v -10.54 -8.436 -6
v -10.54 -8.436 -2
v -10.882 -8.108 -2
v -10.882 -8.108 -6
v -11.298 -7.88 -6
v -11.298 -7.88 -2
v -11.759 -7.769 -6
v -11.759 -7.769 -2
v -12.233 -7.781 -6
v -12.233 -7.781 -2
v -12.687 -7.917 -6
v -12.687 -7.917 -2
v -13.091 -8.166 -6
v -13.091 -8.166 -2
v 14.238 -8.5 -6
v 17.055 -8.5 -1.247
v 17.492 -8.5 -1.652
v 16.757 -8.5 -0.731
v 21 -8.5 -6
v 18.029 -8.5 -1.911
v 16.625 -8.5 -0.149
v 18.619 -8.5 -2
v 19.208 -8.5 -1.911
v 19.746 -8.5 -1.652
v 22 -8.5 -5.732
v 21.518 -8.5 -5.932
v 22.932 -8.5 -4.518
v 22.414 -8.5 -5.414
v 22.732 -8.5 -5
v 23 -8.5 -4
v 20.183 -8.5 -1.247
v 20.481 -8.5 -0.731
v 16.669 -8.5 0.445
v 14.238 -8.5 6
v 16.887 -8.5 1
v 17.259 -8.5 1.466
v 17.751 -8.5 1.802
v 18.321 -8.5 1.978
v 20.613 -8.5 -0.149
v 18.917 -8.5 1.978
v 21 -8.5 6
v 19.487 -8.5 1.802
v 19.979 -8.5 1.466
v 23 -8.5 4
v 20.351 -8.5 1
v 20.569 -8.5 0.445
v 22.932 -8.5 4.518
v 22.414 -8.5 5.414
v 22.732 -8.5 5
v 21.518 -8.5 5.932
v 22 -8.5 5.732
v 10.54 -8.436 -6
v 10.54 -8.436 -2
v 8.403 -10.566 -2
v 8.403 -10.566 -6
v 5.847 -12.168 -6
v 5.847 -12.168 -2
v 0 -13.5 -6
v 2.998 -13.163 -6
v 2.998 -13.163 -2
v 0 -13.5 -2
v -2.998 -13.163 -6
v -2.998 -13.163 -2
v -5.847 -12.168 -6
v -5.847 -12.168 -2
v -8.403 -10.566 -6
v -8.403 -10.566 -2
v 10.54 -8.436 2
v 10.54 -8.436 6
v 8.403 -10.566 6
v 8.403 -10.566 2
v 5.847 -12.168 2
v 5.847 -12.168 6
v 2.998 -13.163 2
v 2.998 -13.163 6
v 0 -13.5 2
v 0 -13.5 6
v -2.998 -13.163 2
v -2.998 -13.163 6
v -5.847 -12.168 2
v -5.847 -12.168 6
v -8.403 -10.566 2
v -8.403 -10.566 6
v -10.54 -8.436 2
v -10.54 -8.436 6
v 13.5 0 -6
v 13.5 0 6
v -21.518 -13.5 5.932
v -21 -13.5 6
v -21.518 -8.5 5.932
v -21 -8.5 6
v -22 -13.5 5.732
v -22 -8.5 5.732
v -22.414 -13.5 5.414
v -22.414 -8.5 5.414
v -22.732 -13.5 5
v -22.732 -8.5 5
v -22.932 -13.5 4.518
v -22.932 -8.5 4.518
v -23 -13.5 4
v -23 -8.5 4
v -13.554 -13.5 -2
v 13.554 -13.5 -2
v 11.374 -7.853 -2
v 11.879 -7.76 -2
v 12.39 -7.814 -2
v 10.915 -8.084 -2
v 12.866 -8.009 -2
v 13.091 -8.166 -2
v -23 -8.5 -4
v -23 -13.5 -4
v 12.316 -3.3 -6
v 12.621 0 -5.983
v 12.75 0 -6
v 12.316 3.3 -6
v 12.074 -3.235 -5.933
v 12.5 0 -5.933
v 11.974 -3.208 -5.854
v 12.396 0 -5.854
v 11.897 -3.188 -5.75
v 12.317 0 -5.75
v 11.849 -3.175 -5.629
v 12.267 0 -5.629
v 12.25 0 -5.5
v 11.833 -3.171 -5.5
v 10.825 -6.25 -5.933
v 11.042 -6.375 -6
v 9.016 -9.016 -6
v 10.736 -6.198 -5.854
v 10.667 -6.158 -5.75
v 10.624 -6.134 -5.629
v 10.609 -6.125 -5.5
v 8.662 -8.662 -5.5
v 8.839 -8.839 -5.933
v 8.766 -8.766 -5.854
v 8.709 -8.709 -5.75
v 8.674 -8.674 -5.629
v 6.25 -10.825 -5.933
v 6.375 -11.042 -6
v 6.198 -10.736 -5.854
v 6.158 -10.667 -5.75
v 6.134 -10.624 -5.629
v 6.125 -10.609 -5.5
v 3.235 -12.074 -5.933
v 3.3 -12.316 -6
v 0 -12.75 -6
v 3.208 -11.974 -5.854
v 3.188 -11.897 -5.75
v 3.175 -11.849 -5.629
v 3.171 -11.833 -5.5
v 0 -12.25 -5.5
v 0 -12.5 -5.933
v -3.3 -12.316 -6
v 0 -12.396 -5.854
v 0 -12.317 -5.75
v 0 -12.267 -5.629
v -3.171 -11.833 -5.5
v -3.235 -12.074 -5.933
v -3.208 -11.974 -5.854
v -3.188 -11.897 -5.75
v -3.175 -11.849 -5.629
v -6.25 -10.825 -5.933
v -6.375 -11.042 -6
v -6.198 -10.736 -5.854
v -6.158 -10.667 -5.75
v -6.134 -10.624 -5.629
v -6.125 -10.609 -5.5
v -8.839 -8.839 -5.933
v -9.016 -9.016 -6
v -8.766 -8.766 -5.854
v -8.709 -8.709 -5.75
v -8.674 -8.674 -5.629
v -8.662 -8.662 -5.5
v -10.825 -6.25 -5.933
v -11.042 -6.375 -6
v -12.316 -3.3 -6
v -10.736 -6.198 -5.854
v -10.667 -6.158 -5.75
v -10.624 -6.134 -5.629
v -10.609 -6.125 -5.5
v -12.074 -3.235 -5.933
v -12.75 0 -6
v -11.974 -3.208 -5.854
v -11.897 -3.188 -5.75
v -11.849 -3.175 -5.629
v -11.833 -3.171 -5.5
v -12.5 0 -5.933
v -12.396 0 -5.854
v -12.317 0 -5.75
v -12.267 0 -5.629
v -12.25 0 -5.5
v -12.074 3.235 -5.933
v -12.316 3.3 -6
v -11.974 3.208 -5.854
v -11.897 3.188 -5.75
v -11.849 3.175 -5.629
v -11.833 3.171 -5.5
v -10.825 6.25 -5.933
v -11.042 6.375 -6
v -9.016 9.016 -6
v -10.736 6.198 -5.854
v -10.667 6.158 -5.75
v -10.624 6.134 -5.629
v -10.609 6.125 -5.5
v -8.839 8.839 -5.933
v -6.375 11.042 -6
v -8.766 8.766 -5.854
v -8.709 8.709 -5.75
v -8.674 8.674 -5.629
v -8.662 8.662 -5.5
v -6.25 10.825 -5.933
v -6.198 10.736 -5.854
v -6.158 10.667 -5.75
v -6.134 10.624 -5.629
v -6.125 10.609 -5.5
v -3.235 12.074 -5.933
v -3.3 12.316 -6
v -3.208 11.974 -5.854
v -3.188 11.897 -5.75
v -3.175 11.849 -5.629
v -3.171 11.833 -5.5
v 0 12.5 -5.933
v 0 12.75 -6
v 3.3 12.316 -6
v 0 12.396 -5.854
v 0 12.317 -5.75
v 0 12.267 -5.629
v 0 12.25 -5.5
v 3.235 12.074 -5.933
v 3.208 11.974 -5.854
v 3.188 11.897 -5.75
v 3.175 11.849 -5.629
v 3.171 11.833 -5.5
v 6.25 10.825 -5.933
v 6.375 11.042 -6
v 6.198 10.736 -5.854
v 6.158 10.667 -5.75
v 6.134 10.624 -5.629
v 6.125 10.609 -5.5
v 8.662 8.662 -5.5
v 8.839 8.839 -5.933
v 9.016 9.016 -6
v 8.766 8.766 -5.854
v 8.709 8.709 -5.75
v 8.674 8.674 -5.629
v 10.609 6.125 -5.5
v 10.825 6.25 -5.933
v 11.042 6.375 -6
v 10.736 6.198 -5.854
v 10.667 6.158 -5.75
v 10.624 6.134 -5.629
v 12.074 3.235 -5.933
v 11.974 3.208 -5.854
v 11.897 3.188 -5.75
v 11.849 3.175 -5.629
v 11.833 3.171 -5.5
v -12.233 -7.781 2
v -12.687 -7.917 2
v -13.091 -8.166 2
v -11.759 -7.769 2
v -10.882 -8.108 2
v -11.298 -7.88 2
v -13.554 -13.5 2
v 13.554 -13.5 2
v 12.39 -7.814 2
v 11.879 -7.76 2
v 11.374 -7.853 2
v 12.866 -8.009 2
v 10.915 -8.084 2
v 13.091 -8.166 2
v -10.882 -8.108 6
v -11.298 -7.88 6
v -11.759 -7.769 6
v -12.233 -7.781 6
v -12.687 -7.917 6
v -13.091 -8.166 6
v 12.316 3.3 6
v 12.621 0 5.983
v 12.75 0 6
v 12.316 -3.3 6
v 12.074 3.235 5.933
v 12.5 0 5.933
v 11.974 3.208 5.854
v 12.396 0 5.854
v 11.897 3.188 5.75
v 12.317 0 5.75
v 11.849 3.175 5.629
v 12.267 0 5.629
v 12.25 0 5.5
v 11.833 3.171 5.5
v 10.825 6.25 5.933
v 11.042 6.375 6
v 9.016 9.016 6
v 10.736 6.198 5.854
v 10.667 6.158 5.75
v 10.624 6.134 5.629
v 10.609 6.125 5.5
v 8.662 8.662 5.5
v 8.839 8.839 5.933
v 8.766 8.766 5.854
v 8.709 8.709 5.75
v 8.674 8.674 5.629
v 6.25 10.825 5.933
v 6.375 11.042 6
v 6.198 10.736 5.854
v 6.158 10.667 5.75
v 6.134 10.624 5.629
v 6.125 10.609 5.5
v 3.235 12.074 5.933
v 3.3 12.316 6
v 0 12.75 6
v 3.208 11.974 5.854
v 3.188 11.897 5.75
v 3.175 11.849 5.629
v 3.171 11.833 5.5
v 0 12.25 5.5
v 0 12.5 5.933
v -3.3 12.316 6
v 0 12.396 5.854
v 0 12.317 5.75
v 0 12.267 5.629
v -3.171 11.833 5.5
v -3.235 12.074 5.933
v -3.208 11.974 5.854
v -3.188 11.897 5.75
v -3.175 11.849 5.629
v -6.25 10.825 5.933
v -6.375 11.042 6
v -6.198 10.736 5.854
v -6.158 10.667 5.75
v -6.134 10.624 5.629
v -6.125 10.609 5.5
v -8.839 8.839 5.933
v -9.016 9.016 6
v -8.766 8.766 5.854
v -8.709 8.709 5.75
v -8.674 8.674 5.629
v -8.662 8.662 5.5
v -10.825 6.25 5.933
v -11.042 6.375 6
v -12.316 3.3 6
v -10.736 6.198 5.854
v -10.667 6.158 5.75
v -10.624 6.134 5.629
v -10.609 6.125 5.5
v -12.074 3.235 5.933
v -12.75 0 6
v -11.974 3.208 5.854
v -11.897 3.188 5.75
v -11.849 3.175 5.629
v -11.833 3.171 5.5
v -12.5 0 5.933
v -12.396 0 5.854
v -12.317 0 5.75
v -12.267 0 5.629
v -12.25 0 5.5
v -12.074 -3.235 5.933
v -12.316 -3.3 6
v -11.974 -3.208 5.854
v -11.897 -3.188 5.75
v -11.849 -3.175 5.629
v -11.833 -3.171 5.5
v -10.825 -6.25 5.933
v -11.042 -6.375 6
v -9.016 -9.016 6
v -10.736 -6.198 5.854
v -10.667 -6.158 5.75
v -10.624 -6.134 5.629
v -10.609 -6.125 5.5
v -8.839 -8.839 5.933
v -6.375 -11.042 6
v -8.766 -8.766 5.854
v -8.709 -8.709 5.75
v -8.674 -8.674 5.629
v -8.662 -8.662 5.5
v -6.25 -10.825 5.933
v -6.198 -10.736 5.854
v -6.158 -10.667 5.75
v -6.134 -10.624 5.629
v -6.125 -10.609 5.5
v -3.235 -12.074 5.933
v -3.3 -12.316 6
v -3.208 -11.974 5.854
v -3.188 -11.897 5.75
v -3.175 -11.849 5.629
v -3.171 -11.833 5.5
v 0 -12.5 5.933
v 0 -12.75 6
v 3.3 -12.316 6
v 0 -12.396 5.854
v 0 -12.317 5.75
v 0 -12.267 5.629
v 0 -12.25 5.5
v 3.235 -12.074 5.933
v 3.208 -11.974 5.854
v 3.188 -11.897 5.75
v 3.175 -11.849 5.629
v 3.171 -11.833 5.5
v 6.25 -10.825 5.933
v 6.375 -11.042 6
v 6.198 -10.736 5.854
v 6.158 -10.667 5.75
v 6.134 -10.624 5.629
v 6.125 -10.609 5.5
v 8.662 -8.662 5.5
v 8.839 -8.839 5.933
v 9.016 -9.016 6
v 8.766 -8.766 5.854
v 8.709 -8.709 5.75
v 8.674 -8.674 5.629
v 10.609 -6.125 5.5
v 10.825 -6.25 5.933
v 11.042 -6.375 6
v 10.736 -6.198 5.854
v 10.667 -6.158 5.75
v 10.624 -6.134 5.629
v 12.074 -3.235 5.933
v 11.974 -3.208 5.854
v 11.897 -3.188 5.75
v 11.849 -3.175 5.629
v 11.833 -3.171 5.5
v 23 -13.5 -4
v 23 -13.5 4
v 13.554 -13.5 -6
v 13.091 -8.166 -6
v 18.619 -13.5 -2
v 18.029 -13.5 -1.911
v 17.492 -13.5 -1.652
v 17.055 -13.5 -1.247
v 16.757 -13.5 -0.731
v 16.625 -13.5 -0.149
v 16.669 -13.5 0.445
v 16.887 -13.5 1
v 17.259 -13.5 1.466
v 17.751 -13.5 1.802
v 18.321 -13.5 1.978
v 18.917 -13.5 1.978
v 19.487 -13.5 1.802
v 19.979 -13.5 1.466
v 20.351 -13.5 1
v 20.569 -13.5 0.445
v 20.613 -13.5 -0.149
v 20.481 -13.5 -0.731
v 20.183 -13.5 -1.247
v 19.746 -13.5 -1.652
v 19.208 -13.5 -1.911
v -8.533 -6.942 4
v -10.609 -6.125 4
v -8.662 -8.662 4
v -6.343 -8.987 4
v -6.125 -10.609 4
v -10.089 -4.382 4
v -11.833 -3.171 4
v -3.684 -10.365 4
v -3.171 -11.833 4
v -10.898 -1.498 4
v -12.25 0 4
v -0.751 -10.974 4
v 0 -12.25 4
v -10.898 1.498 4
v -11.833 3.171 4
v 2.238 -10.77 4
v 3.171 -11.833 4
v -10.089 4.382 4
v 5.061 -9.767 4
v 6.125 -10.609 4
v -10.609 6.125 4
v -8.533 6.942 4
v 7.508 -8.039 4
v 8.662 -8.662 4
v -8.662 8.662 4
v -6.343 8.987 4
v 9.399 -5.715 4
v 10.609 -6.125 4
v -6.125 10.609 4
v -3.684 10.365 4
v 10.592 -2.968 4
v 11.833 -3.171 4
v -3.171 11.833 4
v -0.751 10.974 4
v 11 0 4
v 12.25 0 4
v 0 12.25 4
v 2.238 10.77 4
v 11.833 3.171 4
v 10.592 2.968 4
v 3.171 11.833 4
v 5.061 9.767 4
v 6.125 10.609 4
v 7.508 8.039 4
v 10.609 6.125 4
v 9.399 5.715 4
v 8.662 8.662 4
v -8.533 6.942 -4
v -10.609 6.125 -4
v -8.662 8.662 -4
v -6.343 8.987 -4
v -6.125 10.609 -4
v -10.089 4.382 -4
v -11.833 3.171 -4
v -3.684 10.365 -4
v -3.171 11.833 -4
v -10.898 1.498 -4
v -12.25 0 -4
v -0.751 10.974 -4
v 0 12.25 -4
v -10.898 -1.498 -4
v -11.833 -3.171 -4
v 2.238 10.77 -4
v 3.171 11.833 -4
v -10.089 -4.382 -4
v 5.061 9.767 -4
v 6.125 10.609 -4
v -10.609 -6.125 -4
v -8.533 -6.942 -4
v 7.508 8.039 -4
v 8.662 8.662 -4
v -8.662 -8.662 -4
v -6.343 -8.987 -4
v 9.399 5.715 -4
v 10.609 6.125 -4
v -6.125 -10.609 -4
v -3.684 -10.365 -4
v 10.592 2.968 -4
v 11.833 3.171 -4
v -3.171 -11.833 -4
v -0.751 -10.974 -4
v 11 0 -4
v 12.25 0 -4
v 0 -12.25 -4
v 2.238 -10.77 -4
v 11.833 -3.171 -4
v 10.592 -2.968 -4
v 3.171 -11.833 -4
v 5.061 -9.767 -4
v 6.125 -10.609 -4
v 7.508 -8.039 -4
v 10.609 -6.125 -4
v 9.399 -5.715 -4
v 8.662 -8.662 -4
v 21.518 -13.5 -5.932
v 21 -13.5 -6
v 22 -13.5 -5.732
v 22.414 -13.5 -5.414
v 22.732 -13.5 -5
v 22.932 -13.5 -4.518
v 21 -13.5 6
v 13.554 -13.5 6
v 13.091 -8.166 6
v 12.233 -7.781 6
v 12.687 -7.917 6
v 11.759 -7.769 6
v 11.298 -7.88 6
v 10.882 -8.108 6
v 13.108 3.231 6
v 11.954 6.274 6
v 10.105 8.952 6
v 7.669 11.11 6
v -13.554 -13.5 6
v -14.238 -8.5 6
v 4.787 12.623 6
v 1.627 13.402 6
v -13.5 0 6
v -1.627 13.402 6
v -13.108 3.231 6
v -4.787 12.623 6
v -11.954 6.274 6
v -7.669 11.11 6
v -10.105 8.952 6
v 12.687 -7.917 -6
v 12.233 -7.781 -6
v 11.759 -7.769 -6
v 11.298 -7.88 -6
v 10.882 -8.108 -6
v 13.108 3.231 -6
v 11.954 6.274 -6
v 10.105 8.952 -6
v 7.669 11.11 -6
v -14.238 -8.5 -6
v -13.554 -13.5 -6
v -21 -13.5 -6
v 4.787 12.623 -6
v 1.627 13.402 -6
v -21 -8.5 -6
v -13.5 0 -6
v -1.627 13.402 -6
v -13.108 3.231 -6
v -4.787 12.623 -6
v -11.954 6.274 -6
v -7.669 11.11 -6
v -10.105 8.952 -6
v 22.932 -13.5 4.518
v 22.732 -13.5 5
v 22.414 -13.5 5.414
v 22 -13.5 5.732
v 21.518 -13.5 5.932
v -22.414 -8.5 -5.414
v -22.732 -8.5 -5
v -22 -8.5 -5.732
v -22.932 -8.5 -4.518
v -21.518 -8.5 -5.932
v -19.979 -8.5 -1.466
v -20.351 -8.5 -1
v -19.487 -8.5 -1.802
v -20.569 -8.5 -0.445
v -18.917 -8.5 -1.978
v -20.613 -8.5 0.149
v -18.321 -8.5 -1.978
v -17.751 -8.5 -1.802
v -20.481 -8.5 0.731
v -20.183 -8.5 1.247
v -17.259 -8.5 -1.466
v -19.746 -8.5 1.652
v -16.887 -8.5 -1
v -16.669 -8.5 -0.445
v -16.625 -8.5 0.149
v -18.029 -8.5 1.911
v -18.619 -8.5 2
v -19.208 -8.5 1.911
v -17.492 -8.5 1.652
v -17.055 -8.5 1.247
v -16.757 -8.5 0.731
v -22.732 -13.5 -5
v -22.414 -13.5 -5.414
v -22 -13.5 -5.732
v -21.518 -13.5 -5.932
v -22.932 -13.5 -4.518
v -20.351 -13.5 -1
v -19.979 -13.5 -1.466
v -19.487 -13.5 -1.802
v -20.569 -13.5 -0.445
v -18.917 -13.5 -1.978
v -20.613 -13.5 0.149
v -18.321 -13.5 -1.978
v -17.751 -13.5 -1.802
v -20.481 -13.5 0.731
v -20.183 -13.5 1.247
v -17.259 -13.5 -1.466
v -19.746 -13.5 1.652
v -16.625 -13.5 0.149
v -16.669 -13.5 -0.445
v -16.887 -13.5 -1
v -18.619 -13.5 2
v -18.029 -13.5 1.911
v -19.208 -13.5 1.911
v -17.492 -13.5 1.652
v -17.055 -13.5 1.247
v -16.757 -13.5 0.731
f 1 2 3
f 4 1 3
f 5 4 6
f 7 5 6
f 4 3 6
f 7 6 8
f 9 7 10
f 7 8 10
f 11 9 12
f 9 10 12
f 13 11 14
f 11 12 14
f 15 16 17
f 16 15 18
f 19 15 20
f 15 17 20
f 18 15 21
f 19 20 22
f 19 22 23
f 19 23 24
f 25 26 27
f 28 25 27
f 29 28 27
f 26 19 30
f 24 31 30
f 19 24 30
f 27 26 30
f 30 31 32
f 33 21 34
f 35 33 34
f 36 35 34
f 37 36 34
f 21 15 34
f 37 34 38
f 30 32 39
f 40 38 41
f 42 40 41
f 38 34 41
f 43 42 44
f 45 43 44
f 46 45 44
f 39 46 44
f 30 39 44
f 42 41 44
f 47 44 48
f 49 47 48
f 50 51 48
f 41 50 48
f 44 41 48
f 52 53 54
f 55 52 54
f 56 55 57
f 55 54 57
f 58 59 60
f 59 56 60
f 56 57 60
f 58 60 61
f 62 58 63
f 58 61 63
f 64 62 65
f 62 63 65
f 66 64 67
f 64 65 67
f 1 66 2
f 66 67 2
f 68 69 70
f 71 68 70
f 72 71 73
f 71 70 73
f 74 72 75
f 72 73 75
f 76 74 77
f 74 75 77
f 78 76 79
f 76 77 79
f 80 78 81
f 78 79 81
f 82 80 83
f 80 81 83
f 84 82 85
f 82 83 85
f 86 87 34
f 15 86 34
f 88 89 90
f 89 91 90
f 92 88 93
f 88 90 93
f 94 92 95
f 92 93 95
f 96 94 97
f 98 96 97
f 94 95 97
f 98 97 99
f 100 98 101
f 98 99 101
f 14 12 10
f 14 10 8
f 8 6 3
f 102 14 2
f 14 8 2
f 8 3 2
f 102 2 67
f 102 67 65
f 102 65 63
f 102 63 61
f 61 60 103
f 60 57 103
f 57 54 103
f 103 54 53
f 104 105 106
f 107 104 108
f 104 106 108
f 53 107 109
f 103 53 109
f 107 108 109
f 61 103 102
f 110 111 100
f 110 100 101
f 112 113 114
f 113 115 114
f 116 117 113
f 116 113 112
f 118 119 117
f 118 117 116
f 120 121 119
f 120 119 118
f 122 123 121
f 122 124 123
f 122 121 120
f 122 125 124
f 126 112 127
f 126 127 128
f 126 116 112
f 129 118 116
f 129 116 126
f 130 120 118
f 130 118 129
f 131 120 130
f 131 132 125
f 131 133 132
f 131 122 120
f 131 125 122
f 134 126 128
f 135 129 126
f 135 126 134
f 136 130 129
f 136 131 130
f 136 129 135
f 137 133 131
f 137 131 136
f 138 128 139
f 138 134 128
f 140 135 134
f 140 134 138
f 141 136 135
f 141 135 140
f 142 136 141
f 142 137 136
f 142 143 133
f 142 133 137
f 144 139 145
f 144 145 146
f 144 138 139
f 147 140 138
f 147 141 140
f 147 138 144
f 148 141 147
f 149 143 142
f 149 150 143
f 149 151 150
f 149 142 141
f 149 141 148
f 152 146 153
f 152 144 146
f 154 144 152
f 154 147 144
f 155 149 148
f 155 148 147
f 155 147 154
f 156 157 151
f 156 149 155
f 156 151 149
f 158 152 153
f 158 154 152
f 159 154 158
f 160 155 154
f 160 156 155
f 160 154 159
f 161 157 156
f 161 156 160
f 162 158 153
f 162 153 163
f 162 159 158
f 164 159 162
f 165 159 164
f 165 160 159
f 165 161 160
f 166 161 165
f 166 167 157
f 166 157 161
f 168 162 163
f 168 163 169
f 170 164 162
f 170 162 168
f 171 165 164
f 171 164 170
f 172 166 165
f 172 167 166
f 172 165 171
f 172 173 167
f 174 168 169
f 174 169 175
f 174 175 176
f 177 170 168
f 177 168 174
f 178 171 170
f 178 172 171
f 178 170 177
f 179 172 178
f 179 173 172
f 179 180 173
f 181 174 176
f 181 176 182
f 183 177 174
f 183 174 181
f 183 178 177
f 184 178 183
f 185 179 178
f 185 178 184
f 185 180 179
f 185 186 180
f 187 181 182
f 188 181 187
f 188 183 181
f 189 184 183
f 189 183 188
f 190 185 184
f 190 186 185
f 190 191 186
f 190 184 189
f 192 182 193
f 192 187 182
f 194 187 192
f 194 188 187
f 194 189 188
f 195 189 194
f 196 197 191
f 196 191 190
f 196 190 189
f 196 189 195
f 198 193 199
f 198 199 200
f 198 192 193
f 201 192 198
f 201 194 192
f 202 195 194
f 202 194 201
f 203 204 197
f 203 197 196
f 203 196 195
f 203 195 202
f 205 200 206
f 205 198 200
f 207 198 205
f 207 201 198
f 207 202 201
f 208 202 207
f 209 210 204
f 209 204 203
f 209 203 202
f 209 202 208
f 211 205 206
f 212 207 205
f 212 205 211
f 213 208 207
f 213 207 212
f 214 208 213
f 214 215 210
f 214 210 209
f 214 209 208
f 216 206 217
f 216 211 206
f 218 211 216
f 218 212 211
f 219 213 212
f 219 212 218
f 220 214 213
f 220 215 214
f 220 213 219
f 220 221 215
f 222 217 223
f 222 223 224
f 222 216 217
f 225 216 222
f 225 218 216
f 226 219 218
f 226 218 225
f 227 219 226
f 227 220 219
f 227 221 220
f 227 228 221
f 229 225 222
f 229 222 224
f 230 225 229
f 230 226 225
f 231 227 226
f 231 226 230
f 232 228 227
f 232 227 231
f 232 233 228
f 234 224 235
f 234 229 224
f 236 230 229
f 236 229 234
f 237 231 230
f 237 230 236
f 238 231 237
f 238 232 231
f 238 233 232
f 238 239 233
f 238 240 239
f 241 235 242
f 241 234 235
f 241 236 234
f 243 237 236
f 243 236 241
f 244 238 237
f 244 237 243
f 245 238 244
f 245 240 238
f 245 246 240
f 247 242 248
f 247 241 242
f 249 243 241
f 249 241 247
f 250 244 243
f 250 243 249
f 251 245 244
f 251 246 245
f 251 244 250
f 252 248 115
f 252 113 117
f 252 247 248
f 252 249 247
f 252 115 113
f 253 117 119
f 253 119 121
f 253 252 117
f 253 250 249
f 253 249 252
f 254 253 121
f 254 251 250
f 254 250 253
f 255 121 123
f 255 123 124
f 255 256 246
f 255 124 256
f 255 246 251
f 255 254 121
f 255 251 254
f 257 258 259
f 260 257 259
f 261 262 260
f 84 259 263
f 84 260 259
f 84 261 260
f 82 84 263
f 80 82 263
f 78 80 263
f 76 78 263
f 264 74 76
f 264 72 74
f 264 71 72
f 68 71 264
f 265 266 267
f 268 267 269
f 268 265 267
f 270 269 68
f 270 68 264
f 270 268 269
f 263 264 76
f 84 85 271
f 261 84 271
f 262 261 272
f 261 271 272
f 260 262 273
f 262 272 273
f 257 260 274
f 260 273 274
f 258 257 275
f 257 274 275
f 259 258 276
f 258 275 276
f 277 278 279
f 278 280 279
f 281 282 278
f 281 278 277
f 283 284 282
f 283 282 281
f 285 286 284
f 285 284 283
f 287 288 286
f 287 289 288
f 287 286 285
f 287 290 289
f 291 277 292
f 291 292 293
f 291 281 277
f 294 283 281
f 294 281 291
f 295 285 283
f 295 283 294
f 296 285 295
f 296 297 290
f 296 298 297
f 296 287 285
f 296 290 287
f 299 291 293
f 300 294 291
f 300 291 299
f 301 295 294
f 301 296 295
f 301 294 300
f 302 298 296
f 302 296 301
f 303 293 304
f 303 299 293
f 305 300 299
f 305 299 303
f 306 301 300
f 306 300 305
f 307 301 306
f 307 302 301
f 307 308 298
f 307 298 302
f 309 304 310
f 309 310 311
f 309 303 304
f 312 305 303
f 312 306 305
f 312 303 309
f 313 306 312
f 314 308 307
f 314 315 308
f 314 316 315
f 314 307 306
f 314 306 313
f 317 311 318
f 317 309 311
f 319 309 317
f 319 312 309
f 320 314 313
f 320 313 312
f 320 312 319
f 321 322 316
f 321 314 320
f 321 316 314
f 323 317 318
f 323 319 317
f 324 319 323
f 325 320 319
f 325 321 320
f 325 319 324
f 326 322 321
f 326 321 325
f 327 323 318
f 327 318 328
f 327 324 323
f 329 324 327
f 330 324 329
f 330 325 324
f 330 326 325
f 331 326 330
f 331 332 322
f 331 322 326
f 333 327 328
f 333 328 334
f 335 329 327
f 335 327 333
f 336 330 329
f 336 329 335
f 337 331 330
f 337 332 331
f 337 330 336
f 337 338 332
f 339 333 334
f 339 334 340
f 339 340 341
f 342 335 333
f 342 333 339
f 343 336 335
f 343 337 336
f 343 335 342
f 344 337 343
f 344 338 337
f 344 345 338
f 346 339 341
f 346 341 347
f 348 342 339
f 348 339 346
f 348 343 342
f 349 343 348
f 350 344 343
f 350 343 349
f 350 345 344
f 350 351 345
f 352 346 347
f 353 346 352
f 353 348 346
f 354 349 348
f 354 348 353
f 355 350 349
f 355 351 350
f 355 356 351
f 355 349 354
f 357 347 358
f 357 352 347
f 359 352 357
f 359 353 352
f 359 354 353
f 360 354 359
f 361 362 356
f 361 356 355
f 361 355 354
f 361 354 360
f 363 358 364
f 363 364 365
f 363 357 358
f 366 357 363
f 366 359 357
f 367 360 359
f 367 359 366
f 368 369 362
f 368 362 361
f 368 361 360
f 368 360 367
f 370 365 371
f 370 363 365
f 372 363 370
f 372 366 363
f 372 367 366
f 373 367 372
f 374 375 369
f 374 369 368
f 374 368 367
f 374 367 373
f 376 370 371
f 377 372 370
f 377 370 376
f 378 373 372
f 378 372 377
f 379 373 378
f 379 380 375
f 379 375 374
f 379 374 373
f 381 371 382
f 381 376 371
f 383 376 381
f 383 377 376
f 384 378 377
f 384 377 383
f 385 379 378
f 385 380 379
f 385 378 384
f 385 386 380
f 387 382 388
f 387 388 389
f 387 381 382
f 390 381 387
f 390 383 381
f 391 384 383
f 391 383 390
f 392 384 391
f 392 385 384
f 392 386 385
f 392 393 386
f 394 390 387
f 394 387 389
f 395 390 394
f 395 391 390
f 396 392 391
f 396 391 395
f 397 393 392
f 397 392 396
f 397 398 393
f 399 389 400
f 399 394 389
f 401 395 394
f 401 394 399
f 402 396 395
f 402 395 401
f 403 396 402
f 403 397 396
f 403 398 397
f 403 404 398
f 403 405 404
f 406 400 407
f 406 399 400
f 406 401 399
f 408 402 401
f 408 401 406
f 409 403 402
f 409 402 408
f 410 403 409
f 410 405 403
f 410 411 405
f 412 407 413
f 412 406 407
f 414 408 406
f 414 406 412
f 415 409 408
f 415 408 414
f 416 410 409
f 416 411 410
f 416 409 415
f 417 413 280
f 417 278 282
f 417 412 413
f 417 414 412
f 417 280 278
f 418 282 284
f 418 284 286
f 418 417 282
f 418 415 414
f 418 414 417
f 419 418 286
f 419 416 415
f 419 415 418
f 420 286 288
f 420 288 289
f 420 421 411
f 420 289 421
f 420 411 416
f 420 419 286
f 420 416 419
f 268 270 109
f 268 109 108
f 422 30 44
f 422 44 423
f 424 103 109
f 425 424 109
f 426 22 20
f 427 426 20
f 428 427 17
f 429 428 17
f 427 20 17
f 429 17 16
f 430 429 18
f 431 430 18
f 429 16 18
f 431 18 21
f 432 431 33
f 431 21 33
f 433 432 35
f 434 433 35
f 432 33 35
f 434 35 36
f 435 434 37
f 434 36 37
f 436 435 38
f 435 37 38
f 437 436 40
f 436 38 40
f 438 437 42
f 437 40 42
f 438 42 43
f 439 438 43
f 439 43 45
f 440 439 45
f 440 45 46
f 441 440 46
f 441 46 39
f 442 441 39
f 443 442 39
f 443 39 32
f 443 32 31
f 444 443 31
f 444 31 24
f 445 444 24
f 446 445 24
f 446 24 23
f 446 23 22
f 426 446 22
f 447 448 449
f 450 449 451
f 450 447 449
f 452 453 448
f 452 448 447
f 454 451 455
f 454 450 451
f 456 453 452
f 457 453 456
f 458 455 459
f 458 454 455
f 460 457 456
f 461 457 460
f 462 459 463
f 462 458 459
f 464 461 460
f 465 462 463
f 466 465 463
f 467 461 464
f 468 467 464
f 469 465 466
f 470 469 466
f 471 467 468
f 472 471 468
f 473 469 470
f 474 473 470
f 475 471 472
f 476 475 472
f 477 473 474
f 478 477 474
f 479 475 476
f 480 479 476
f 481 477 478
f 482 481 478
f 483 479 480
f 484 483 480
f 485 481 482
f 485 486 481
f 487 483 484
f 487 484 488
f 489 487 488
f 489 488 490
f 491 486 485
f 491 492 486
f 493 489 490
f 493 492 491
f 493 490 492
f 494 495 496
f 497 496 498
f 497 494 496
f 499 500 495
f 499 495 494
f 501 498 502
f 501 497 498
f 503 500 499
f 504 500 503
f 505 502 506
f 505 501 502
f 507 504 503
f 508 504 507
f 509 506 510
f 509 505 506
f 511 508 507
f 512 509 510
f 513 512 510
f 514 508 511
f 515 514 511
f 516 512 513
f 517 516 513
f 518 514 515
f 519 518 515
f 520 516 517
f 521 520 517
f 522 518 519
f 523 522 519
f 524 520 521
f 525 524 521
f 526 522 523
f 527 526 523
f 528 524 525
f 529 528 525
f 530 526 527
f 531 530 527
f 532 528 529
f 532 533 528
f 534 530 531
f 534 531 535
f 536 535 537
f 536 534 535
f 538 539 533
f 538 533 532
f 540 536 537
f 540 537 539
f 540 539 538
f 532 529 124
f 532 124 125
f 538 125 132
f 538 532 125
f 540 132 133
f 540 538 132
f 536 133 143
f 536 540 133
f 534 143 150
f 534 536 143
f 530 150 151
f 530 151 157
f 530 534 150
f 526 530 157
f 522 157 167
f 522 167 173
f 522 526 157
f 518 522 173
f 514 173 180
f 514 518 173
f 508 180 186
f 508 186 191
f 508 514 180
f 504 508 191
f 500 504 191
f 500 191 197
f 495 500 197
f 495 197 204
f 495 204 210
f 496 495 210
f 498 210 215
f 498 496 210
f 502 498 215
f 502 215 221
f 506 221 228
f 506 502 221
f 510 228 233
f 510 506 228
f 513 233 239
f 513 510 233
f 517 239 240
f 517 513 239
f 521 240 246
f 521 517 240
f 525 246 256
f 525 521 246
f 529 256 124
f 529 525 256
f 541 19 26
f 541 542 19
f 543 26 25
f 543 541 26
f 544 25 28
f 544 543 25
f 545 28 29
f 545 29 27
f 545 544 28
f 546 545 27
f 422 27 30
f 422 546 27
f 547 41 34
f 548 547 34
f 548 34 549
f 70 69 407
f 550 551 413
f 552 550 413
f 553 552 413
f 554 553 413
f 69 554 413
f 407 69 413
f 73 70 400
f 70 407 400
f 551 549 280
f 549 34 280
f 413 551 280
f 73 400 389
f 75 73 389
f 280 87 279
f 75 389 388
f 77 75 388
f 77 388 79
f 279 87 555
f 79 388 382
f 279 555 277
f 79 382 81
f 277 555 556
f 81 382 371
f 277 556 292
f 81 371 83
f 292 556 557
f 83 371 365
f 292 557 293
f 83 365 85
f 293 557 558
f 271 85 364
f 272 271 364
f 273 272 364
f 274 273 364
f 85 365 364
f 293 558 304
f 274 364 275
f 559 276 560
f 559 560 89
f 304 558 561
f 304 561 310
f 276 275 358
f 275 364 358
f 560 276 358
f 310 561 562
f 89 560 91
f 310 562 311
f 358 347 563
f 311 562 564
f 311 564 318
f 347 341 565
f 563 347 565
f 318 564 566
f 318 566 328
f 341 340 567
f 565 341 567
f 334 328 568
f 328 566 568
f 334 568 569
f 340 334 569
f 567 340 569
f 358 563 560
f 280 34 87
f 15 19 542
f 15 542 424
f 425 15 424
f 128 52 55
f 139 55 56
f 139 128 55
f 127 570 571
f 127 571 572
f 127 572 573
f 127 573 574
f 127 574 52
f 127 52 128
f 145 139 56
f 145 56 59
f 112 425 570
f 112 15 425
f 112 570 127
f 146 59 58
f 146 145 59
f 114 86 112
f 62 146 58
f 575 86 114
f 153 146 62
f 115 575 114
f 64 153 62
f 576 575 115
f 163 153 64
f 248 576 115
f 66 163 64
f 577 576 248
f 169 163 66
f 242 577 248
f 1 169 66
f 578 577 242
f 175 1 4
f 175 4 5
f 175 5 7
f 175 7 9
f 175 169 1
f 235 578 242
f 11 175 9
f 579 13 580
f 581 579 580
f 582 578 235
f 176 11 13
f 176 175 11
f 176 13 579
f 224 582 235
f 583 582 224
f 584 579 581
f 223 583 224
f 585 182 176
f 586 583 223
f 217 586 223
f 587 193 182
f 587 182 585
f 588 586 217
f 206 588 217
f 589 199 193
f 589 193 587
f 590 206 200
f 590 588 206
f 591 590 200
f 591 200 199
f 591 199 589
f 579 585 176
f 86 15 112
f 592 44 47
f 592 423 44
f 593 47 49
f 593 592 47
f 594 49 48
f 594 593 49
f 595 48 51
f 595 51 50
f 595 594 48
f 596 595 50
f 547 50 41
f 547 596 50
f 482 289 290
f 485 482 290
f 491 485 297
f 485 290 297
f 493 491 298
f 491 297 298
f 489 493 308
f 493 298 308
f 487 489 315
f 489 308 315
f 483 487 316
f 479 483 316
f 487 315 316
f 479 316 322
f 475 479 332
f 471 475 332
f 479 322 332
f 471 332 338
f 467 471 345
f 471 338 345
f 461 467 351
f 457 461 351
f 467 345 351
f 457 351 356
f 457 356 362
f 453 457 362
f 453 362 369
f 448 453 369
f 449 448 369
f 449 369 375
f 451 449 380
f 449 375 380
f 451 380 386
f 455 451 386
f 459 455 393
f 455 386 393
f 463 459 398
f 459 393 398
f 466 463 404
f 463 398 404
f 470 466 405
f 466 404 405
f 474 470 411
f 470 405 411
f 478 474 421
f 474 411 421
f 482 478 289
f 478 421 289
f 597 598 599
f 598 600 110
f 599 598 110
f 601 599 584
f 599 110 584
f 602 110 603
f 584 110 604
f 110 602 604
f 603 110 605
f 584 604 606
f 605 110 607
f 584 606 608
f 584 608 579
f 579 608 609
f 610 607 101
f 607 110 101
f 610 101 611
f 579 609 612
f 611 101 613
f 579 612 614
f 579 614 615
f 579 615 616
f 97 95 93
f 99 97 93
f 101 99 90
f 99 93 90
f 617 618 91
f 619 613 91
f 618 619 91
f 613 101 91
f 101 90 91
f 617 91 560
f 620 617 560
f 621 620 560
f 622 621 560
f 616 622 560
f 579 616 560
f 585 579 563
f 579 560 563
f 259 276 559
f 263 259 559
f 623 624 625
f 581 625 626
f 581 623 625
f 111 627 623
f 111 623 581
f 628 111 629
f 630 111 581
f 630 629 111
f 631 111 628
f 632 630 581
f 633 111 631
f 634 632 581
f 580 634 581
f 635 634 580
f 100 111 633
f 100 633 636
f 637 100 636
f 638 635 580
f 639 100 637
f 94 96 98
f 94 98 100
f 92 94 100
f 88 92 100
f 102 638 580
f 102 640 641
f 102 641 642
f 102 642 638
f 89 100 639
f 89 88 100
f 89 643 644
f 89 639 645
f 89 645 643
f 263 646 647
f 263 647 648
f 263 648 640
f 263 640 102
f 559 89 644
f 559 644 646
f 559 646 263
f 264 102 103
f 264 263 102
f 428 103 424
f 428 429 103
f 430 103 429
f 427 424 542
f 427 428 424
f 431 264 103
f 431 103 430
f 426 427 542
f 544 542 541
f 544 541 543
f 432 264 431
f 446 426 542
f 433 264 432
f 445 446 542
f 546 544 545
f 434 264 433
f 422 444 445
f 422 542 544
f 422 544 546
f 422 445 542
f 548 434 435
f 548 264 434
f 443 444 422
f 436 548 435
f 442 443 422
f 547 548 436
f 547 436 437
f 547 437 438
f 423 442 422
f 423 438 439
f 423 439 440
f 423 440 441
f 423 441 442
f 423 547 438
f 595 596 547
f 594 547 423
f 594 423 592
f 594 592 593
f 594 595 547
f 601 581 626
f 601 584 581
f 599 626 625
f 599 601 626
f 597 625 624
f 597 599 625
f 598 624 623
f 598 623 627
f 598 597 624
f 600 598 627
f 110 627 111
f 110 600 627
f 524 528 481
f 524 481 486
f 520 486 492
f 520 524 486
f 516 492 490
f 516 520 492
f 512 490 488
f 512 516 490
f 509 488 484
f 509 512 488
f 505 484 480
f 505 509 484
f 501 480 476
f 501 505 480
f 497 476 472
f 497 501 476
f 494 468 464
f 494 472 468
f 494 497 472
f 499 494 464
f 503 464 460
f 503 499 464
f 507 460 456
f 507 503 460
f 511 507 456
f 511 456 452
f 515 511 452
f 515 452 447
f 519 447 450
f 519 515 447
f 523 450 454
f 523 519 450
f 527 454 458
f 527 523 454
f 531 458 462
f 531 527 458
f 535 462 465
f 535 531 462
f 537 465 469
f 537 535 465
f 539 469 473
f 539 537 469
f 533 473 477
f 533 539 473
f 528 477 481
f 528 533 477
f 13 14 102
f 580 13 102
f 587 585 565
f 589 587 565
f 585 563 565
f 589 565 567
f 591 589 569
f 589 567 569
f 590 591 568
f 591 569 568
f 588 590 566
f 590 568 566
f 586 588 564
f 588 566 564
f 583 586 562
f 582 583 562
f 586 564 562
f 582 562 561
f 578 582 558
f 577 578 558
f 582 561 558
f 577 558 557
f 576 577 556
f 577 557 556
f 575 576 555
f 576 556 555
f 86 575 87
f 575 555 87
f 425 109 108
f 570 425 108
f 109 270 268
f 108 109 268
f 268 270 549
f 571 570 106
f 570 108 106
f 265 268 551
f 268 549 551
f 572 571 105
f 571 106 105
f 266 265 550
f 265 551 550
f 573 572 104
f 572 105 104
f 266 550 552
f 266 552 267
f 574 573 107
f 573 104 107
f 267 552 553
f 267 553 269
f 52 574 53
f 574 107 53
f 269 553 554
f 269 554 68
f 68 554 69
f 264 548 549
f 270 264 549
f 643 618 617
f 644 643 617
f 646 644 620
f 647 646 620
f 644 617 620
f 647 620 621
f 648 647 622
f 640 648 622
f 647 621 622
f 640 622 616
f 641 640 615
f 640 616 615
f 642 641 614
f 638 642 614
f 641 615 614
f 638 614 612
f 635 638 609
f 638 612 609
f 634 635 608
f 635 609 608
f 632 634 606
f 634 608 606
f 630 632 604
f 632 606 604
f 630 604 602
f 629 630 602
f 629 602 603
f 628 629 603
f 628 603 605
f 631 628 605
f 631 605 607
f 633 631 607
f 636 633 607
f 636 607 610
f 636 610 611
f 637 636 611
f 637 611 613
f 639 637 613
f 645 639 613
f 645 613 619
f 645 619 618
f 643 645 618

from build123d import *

# Parameters (mm, degrees)
CROQUIS1_R              = 11
SALIENTE_EXTRUIR1_DEPTH = 6
CROQUIS2_R              = 2
CORTAR_EXTRUIR1_DEPTH   = 33.388269481
CORTAR_EXTRUIR2_DEPTH   = 30.244657632
SALIENTE_EXTRUIR2_DEPTH = 2
CROQUIS6_R              = 12.25
CORTAR_EXTRUIR3_DEPTH   = 2
CORTAR_EXTRUIR4_START   = -2
CROQUIS7_R              = 12.25
CORTAR_EXTRUIR4_DEPTH   = 2
REDONDEO1_R             = 2
REDONDEO2_R             = 2
REDONDEO3_R             = 2
REDONDEO4_R             = 0.5


with BuildPart() as part:
    # Croquis1 → Saliente-Extruir1 (new, symmetric)
    with BuildSketch(Plane.XY):
        with BuildLine():
            Line((23, -13.5), (-23, -13.5))
            Line((-23, -13.5), (-23, -8.5))
            Line((-23, -8.5), (-14.237940292, -8.5))
            Line((-14.237940292, -8.5), (-13.5, 0))
            ThreePointArc((-13.5, 0), (0, 13.5), (13.5, 0))
            Line((13.5, 0), (14.237940292, -8.5))
            Line((14.237940292, -8.5), (23, -8.5))
            Line((23, -8.5), (23, -13.5))
        make_face()
        Circle(CROQUIS1_R, mode=Mode.SUBTRACT)
    extrude(amount=SALIENTE_EXTRUIR1_DEPTH, both=True)

    # Croquis2 → Cortar-Extruir1 (cut, through all)
    with BuildSketch(Plane(origin=(0, -8.5, 0), x_dir=(1, 0, 0), z_dir=(0, 1, 0))):
        with Locations(Location((-18.618970146, 0, 0), (0, 0, 270))):
            Circle(CROQUIS2_R)
        with Locations(Location((18.618970146, 0, 0), (0, 0, 90))):
            Circle(CROQUIS2_R)
    extrude(amount=-CORTAR_EXTRUIR1_DEPTH, mode=Mode.SUBTRACT)

    # Croquis3 → Cortar-Extruir2 (cut, through all)
    with BuildSketch(Plane.XY.offset(6)):
        with BuildLine():
            Line((-13.553865986, -13.5), (13.553865986, -13.5))
            Line((13.553865986, -13.5), (13.090777783, -8.165896733))
            ThreePointArc((13.090777783, -8.165896733), (11.758860153, -7.768821091), (10.539573747, -8.435915012))
            ThreePointArc((10.539573747, -8.435915012), (0, -13.499899143), (-10.539573747, -8.435915012))
            ThreePointArc((-10.539573747, -8.435915012), (-11.758860153, -7.768821091), (-13.090777783, -8.165896733))
            Line((-13.090777783, -8.165896733), (-13.553865986, -13.5))
        make_face()
    extrude(amount=-CORTAR_EXTRUIR2_DEPTH, mode=Mode.SUBTRACT)

    # Croquis5 → Saliente-Extruir2 (add, symmetric)
    with BuildSketch(Plane.XY):
        Polygon((-13.553865986, -13.5), (13.553865986, -13.5), (13.090777783, -8.165896733), (11.052644105, -6.744861607), (3.381214515, -12.283091016), (-4.357609146, -12.066622794), (-11.573003147, -6.744861607), (-13.322321885, -7.45537917), align=None)
    extrude(amount=SALIENTE_EXTRUIR2_DEPTH, both=True)

    # Croquis6 → Cortar-Extruir3 (cut)
    with BuildSketch(Plane.XY.offset(6)):
        Circle(CROQUIS6_R)
    extrude(amount=-CORTAR_EXTRUIR3_DEPTH, mode=Mode.SUBTRACT)

    # Croquis7 → Cortar-Extruir4 (cut)
    with BuildSketch(Plane(origin=(0, 0, -6), x_dir=(-1, 0, 0), z_dir=(0, 0, -1)).offset(CORTAR_EXTRUIR4_START)):
        with Locations(Location((0, 0, 0), (0, 0, 180))):
            Circle(CROQUIS7_R)
    extrude(amount=CORTAR_EXTRUIR4_DEPTH, mode=Mode.SUBTRACT)

    # Redondeo1
    redondeo1_edges = [part.edges().sort_by_distance(p)[0] for p in [
        (23, -11, -6),
    ]]
    fillet(redondeo1_edges, radius=REDONDEO1_R)

    # Redondeo2
    redondeo2_edges = [part.edges().sort_by_distance(p)[0] for p in [
        (23, -11, 6),
    ]]
    fillet(redondeo2_edges, radius=REDONDEO2_R)

    # Redondeo3
    redondeo3_edges = [part.edges().sort_by_distance(p)[0] for p in [
        (-23, -11, -6),
        (-23, -11, 6),
    ]]
    fillet(redondeo3_edges, radius=REDONDEO3_R)

    # Redondeo4
    redondeo4_edges = [part.edges().sort_by_distance(p)[0] for p in [
        (-12.25, 0, -6),
        (-12.25, 0, 6),
    ]]
    fillet(redondeo4_edges, radius=REDONDEO4_R)


solid = part.part
